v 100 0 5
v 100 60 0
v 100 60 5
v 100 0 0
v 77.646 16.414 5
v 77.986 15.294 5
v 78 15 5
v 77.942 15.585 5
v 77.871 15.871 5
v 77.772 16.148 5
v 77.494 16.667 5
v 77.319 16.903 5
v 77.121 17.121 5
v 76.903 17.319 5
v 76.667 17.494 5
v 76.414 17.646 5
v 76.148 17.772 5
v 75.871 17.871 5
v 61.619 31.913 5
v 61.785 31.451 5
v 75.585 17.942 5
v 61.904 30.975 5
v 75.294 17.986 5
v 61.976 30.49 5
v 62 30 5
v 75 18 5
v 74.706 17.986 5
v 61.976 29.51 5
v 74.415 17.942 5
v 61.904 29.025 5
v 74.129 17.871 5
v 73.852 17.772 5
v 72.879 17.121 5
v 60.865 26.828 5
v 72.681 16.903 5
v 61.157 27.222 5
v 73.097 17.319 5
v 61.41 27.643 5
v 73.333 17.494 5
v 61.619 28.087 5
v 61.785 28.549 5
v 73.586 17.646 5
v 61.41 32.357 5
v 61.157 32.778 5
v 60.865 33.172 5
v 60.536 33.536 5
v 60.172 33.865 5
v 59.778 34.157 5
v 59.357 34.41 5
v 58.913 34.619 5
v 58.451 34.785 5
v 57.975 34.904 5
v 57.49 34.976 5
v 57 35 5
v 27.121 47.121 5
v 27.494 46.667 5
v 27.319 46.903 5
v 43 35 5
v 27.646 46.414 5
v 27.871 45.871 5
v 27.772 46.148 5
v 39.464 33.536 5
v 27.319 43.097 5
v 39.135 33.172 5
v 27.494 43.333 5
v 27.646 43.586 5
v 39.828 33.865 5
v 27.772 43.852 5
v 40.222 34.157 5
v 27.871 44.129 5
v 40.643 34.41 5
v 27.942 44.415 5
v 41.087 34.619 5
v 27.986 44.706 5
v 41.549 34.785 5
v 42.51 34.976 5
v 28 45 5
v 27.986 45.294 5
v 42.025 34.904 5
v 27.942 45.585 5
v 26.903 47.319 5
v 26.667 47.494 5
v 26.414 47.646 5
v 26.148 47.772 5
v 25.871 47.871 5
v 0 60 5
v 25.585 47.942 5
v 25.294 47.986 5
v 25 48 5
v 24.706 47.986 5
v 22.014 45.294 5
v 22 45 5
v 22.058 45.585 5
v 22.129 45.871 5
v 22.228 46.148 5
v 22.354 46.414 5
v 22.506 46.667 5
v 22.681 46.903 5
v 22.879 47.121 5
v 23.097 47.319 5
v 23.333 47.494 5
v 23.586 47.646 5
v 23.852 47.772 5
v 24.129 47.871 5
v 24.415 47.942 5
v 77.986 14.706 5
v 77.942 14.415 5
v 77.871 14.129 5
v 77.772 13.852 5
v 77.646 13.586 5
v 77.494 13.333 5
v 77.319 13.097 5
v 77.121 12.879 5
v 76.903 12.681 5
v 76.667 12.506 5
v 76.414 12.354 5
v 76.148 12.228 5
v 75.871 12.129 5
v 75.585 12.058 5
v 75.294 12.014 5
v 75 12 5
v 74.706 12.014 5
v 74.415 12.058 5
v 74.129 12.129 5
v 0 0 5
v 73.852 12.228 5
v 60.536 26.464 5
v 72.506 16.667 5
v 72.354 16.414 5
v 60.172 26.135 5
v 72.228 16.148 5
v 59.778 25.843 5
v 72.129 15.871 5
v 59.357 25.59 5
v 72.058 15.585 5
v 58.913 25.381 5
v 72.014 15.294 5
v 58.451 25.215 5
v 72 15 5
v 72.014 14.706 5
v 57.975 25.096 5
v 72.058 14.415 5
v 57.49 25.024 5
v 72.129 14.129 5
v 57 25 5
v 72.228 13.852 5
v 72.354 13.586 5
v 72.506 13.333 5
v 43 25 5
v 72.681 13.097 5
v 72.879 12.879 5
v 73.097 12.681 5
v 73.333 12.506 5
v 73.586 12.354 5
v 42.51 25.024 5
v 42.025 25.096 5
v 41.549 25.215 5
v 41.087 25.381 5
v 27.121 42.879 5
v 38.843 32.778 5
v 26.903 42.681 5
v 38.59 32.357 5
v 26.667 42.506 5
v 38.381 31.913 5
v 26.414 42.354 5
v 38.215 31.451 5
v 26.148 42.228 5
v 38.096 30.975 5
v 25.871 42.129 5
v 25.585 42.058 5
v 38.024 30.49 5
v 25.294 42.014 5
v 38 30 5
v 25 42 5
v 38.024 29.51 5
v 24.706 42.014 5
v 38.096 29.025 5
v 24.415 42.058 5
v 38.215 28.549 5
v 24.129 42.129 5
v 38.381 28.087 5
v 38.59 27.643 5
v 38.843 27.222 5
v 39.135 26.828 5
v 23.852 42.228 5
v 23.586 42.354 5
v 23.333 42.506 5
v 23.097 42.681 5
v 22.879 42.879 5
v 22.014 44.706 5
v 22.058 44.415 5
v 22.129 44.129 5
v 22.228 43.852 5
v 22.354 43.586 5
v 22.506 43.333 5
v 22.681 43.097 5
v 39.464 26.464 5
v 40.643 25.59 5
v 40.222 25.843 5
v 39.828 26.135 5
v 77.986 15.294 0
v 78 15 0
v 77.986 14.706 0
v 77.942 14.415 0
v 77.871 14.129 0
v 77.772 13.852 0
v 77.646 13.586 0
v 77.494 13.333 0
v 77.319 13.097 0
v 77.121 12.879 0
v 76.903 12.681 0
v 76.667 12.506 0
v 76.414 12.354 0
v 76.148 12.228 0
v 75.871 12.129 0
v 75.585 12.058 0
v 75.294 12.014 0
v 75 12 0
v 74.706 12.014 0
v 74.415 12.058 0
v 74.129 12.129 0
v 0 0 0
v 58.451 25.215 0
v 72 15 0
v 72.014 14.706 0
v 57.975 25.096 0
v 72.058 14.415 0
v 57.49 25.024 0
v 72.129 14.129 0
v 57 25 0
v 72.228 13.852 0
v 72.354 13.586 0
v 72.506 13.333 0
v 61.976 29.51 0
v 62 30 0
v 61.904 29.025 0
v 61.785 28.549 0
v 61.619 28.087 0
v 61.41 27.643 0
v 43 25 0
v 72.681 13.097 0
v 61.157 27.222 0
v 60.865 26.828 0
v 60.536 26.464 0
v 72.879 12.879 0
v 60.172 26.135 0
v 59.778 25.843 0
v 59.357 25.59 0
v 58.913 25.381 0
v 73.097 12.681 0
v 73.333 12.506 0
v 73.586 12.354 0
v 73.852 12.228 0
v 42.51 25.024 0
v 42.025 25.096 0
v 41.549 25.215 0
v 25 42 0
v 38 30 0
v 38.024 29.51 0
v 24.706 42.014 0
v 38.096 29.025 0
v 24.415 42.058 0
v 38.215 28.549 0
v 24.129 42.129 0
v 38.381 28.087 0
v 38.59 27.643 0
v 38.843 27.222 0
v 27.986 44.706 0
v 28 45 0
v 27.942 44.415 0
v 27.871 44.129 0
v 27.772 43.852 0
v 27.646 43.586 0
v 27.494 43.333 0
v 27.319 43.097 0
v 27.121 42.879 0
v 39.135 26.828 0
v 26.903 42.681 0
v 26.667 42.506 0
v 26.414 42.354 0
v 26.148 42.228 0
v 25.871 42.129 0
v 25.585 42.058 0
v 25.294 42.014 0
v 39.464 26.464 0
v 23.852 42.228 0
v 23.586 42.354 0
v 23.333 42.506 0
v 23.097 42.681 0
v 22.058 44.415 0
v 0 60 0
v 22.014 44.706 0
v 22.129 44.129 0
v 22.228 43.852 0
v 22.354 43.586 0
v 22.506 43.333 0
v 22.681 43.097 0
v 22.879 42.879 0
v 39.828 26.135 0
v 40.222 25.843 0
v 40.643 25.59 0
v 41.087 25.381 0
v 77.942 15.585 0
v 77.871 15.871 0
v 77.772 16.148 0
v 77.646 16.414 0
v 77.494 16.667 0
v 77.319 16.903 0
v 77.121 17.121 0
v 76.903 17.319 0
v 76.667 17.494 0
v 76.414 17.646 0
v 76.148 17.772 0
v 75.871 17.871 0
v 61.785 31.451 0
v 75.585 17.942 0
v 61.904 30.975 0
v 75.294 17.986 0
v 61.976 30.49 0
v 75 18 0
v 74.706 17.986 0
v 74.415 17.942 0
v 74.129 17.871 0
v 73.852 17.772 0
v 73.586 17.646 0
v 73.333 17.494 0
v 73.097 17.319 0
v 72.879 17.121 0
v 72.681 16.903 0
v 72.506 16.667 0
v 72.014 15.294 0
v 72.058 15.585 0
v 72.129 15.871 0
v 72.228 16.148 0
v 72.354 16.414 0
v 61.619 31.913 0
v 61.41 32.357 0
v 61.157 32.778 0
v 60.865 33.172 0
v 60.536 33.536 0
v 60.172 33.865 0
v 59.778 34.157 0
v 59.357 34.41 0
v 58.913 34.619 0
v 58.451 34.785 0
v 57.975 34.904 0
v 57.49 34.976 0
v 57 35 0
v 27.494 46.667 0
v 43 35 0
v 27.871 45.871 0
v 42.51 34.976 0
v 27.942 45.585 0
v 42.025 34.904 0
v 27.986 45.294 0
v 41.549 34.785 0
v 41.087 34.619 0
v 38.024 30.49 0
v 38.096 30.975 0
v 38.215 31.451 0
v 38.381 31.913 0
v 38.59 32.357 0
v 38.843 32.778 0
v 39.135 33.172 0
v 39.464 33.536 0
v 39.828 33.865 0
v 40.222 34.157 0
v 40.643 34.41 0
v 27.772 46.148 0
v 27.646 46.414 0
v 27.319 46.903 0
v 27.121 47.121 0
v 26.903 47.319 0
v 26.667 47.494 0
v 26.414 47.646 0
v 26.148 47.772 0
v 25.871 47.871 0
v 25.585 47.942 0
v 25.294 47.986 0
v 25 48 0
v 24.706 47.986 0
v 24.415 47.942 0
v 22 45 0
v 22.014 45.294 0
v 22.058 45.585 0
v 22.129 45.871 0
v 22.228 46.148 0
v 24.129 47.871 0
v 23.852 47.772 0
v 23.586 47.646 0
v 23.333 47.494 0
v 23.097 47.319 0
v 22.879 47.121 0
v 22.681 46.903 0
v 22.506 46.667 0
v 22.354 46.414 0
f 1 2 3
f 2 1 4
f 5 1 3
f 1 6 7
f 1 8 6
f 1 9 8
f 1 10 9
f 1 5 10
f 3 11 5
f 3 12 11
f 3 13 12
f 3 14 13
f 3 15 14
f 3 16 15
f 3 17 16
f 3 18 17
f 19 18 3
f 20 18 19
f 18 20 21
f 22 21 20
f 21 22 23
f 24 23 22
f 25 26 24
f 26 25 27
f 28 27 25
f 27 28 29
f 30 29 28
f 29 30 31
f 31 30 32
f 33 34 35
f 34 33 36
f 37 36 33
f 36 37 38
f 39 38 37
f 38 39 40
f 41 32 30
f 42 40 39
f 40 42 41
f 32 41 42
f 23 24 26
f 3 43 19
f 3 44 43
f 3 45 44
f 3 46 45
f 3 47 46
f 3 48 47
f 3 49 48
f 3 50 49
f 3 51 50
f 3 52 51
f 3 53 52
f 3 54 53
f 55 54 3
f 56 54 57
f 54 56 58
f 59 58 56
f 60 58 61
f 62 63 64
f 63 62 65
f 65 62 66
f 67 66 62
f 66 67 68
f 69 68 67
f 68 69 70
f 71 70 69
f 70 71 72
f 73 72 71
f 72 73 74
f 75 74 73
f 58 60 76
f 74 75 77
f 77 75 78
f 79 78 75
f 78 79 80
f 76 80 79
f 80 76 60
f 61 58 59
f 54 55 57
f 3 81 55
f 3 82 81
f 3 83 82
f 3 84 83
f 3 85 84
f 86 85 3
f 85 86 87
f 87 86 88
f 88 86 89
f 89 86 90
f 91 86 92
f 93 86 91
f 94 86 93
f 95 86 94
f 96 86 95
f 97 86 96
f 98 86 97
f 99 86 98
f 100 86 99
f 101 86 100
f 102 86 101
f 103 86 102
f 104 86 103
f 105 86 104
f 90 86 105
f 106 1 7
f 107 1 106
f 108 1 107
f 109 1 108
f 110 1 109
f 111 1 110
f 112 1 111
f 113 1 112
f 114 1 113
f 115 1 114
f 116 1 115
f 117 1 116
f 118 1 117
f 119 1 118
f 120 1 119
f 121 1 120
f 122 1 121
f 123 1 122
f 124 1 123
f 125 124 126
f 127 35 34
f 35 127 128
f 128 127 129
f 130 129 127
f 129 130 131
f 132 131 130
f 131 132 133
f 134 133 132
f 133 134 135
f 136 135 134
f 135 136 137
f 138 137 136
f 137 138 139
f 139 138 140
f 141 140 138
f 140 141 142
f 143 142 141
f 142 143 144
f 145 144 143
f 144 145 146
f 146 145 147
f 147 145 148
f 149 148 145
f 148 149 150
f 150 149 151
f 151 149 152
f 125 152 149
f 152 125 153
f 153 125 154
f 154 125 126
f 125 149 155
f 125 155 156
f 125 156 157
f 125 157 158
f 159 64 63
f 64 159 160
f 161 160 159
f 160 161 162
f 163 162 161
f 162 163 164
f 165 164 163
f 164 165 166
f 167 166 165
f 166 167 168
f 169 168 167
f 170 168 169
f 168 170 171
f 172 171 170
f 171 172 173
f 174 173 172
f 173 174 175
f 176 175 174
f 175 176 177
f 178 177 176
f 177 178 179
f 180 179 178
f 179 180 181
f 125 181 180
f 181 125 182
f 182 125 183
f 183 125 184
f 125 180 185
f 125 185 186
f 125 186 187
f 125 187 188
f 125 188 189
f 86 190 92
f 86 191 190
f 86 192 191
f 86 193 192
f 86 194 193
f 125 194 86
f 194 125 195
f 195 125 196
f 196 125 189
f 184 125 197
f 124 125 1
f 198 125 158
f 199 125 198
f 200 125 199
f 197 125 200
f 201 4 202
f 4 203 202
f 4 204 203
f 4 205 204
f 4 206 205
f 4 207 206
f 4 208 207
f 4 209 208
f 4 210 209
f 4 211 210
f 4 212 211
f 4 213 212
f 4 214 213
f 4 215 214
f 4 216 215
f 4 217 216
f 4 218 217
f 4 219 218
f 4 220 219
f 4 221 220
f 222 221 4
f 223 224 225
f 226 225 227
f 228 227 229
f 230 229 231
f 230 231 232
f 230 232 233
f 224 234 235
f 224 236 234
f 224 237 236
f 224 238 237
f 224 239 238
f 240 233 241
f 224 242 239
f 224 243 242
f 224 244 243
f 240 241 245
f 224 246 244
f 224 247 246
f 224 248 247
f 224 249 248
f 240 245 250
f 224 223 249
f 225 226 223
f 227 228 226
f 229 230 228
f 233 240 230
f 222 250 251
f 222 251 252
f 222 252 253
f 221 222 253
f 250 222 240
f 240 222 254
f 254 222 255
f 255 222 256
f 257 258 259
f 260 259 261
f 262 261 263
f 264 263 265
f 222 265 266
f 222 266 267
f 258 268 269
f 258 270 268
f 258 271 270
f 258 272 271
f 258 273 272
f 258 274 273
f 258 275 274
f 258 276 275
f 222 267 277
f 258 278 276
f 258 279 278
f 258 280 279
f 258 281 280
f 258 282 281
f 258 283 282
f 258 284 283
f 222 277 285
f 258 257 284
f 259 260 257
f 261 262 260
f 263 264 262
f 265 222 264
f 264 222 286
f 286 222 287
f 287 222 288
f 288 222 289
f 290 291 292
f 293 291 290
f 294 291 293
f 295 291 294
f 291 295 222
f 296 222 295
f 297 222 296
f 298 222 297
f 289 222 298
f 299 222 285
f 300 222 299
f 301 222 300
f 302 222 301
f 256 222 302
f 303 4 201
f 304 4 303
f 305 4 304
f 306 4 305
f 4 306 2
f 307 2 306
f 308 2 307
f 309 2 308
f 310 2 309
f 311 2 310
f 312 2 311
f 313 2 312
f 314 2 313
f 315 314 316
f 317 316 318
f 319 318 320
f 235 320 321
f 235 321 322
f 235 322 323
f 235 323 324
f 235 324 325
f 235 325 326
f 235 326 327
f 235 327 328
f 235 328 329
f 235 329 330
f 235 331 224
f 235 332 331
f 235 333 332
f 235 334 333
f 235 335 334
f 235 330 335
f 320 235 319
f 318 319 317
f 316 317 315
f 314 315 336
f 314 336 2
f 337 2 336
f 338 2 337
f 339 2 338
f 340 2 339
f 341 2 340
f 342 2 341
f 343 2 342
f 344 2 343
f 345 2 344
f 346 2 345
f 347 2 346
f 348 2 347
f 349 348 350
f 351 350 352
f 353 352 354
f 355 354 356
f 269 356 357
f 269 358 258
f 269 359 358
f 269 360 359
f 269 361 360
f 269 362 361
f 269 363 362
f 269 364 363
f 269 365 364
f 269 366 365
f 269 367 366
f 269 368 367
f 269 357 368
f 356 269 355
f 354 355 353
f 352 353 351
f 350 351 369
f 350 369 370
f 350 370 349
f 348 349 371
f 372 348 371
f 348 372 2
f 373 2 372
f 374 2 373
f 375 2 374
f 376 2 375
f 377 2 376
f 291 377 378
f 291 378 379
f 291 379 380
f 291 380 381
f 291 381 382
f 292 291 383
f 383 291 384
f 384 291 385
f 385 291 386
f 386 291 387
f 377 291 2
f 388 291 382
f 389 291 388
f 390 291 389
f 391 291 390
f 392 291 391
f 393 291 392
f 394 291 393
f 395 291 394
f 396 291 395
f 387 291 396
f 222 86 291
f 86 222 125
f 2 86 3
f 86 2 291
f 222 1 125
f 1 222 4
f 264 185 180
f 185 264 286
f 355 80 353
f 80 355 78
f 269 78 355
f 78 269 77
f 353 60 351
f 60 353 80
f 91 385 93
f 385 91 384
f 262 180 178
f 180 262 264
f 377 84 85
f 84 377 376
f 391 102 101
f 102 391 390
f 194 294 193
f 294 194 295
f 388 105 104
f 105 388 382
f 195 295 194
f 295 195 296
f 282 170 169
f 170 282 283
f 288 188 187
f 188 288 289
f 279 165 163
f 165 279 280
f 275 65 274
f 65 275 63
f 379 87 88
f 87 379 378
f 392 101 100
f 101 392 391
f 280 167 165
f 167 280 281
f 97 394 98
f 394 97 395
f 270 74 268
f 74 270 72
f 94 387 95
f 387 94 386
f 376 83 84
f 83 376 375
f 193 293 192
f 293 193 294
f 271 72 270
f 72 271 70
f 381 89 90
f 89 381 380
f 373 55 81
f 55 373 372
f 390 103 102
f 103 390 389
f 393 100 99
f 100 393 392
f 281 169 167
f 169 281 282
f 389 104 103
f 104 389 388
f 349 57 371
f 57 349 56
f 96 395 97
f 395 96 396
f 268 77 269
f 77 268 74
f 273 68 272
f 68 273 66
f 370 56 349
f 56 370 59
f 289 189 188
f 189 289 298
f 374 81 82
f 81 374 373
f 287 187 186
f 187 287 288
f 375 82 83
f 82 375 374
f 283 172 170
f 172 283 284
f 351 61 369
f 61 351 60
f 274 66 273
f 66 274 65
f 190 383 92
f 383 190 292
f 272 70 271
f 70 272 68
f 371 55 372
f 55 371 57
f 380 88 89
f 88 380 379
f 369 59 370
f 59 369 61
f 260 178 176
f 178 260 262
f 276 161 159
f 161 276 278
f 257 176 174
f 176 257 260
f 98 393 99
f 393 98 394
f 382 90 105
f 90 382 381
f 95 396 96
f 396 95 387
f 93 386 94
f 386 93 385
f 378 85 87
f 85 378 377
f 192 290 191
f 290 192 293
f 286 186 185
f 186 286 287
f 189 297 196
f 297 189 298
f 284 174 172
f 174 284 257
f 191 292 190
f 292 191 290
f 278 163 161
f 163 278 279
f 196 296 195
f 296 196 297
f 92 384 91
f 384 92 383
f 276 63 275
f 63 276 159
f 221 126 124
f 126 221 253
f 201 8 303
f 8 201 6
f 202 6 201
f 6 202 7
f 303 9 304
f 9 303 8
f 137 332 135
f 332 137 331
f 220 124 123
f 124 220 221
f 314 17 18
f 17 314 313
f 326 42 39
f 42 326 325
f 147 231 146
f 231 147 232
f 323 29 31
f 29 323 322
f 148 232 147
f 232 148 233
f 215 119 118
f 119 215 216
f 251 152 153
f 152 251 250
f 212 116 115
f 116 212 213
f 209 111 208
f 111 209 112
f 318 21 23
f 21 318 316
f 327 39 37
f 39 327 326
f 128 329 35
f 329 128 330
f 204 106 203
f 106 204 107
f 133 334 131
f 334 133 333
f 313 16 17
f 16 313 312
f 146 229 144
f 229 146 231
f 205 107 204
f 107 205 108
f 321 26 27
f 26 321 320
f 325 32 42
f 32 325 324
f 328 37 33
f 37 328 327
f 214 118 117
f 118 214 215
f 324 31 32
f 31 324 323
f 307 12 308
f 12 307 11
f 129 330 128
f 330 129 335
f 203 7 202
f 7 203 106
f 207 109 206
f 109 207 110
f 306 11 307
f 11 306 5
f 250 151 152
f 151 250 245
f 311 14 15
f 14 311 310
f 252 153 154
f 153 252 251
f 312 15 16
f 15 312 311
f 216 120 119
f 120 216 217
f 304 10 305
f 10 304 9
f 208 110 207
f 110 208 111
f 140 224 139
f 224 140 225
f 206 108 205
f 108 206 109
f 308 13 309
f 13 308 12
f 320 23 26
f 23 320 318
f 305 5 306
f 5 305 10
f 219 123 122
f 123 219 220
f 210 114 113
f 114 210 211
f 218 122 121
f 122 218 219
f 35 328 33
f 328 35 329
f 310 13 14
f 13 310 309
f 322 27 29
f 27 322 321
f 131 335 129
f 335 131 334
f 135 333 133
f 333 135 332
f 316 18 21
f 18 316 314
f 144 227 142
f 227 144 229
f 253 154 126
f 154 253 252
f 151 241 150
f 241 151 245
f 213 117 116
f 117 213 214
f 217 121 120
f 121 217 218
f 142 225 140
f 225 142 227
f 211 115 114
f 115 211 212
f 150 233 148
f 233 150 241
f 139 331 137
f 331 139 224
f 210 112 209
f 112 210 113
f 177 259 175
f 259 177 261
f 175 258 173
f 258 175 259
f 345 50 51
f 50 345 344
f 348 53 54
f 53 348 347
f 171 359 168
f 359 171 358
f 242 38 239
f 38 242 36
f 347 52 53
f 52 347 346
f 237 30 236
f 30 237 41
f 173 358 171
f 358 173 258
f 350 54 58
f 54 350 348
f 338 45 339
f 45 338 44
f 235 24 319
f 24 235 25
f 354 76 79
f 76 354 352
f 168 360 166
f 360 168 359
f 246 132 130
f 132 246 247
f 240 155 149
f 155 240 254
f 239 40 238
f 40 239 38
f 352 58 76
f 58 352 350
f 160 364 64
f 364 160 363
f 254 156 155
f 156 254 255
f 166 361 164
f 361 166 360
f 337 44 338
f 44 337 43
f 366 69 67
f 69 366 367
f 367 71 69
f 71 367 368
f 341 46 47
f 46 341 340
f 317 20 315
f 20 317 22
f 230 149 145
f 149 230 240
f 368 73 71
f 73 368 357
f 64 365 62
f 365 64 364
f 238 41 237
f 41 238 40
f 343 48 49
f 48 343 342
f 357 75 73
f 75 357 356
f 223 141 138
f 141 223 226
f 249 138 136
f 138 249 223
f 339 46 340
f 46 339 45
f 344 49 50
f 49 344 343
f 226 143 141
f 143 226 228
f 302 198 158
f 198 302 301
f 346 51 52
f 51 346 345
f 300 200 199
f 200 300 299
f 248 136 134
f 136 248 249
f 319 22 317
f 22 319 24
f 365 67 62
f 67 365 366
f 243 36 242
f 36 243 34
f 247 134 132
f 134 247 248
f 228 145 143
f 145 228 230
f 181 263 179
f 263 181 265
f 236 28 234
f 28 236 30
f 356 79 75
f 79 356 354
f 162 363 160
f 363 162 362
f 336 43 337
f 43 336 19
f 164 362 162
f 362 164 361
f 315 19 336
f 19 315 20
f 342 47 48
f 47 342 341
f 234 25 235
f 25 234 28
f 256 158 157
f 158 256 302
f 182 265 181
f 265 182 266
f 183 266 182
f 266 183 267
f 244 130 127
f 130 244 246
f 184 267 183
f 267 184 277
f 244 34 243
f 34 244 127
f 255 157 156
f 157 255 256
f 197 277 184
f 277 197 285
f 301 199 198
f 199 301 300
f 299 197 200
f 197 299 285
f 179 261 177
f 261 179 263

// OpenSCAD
// fixture: known-correct baseline for the 004 plate family
// mirrors the GT reference: 100x60x5, two d6 holes + 24x10 center slot, genus 3
$fn = 64;
difference() {
  cube([100, 60, 5]);
  translate([25, 45, -1]) cylinder(d = 6, h = 7);
  translate([75, 15, -1]) cylinder(d = 6, h = 7);
  translate([50, 30, -1])
    linear_extrude(height = 7)
      hull() {
        translate([-(24 - 10) / 2, 0]) circle(d = 10);
        translate([(24 - 10) / 2, 0]) circle(d = 10);
      }
}
